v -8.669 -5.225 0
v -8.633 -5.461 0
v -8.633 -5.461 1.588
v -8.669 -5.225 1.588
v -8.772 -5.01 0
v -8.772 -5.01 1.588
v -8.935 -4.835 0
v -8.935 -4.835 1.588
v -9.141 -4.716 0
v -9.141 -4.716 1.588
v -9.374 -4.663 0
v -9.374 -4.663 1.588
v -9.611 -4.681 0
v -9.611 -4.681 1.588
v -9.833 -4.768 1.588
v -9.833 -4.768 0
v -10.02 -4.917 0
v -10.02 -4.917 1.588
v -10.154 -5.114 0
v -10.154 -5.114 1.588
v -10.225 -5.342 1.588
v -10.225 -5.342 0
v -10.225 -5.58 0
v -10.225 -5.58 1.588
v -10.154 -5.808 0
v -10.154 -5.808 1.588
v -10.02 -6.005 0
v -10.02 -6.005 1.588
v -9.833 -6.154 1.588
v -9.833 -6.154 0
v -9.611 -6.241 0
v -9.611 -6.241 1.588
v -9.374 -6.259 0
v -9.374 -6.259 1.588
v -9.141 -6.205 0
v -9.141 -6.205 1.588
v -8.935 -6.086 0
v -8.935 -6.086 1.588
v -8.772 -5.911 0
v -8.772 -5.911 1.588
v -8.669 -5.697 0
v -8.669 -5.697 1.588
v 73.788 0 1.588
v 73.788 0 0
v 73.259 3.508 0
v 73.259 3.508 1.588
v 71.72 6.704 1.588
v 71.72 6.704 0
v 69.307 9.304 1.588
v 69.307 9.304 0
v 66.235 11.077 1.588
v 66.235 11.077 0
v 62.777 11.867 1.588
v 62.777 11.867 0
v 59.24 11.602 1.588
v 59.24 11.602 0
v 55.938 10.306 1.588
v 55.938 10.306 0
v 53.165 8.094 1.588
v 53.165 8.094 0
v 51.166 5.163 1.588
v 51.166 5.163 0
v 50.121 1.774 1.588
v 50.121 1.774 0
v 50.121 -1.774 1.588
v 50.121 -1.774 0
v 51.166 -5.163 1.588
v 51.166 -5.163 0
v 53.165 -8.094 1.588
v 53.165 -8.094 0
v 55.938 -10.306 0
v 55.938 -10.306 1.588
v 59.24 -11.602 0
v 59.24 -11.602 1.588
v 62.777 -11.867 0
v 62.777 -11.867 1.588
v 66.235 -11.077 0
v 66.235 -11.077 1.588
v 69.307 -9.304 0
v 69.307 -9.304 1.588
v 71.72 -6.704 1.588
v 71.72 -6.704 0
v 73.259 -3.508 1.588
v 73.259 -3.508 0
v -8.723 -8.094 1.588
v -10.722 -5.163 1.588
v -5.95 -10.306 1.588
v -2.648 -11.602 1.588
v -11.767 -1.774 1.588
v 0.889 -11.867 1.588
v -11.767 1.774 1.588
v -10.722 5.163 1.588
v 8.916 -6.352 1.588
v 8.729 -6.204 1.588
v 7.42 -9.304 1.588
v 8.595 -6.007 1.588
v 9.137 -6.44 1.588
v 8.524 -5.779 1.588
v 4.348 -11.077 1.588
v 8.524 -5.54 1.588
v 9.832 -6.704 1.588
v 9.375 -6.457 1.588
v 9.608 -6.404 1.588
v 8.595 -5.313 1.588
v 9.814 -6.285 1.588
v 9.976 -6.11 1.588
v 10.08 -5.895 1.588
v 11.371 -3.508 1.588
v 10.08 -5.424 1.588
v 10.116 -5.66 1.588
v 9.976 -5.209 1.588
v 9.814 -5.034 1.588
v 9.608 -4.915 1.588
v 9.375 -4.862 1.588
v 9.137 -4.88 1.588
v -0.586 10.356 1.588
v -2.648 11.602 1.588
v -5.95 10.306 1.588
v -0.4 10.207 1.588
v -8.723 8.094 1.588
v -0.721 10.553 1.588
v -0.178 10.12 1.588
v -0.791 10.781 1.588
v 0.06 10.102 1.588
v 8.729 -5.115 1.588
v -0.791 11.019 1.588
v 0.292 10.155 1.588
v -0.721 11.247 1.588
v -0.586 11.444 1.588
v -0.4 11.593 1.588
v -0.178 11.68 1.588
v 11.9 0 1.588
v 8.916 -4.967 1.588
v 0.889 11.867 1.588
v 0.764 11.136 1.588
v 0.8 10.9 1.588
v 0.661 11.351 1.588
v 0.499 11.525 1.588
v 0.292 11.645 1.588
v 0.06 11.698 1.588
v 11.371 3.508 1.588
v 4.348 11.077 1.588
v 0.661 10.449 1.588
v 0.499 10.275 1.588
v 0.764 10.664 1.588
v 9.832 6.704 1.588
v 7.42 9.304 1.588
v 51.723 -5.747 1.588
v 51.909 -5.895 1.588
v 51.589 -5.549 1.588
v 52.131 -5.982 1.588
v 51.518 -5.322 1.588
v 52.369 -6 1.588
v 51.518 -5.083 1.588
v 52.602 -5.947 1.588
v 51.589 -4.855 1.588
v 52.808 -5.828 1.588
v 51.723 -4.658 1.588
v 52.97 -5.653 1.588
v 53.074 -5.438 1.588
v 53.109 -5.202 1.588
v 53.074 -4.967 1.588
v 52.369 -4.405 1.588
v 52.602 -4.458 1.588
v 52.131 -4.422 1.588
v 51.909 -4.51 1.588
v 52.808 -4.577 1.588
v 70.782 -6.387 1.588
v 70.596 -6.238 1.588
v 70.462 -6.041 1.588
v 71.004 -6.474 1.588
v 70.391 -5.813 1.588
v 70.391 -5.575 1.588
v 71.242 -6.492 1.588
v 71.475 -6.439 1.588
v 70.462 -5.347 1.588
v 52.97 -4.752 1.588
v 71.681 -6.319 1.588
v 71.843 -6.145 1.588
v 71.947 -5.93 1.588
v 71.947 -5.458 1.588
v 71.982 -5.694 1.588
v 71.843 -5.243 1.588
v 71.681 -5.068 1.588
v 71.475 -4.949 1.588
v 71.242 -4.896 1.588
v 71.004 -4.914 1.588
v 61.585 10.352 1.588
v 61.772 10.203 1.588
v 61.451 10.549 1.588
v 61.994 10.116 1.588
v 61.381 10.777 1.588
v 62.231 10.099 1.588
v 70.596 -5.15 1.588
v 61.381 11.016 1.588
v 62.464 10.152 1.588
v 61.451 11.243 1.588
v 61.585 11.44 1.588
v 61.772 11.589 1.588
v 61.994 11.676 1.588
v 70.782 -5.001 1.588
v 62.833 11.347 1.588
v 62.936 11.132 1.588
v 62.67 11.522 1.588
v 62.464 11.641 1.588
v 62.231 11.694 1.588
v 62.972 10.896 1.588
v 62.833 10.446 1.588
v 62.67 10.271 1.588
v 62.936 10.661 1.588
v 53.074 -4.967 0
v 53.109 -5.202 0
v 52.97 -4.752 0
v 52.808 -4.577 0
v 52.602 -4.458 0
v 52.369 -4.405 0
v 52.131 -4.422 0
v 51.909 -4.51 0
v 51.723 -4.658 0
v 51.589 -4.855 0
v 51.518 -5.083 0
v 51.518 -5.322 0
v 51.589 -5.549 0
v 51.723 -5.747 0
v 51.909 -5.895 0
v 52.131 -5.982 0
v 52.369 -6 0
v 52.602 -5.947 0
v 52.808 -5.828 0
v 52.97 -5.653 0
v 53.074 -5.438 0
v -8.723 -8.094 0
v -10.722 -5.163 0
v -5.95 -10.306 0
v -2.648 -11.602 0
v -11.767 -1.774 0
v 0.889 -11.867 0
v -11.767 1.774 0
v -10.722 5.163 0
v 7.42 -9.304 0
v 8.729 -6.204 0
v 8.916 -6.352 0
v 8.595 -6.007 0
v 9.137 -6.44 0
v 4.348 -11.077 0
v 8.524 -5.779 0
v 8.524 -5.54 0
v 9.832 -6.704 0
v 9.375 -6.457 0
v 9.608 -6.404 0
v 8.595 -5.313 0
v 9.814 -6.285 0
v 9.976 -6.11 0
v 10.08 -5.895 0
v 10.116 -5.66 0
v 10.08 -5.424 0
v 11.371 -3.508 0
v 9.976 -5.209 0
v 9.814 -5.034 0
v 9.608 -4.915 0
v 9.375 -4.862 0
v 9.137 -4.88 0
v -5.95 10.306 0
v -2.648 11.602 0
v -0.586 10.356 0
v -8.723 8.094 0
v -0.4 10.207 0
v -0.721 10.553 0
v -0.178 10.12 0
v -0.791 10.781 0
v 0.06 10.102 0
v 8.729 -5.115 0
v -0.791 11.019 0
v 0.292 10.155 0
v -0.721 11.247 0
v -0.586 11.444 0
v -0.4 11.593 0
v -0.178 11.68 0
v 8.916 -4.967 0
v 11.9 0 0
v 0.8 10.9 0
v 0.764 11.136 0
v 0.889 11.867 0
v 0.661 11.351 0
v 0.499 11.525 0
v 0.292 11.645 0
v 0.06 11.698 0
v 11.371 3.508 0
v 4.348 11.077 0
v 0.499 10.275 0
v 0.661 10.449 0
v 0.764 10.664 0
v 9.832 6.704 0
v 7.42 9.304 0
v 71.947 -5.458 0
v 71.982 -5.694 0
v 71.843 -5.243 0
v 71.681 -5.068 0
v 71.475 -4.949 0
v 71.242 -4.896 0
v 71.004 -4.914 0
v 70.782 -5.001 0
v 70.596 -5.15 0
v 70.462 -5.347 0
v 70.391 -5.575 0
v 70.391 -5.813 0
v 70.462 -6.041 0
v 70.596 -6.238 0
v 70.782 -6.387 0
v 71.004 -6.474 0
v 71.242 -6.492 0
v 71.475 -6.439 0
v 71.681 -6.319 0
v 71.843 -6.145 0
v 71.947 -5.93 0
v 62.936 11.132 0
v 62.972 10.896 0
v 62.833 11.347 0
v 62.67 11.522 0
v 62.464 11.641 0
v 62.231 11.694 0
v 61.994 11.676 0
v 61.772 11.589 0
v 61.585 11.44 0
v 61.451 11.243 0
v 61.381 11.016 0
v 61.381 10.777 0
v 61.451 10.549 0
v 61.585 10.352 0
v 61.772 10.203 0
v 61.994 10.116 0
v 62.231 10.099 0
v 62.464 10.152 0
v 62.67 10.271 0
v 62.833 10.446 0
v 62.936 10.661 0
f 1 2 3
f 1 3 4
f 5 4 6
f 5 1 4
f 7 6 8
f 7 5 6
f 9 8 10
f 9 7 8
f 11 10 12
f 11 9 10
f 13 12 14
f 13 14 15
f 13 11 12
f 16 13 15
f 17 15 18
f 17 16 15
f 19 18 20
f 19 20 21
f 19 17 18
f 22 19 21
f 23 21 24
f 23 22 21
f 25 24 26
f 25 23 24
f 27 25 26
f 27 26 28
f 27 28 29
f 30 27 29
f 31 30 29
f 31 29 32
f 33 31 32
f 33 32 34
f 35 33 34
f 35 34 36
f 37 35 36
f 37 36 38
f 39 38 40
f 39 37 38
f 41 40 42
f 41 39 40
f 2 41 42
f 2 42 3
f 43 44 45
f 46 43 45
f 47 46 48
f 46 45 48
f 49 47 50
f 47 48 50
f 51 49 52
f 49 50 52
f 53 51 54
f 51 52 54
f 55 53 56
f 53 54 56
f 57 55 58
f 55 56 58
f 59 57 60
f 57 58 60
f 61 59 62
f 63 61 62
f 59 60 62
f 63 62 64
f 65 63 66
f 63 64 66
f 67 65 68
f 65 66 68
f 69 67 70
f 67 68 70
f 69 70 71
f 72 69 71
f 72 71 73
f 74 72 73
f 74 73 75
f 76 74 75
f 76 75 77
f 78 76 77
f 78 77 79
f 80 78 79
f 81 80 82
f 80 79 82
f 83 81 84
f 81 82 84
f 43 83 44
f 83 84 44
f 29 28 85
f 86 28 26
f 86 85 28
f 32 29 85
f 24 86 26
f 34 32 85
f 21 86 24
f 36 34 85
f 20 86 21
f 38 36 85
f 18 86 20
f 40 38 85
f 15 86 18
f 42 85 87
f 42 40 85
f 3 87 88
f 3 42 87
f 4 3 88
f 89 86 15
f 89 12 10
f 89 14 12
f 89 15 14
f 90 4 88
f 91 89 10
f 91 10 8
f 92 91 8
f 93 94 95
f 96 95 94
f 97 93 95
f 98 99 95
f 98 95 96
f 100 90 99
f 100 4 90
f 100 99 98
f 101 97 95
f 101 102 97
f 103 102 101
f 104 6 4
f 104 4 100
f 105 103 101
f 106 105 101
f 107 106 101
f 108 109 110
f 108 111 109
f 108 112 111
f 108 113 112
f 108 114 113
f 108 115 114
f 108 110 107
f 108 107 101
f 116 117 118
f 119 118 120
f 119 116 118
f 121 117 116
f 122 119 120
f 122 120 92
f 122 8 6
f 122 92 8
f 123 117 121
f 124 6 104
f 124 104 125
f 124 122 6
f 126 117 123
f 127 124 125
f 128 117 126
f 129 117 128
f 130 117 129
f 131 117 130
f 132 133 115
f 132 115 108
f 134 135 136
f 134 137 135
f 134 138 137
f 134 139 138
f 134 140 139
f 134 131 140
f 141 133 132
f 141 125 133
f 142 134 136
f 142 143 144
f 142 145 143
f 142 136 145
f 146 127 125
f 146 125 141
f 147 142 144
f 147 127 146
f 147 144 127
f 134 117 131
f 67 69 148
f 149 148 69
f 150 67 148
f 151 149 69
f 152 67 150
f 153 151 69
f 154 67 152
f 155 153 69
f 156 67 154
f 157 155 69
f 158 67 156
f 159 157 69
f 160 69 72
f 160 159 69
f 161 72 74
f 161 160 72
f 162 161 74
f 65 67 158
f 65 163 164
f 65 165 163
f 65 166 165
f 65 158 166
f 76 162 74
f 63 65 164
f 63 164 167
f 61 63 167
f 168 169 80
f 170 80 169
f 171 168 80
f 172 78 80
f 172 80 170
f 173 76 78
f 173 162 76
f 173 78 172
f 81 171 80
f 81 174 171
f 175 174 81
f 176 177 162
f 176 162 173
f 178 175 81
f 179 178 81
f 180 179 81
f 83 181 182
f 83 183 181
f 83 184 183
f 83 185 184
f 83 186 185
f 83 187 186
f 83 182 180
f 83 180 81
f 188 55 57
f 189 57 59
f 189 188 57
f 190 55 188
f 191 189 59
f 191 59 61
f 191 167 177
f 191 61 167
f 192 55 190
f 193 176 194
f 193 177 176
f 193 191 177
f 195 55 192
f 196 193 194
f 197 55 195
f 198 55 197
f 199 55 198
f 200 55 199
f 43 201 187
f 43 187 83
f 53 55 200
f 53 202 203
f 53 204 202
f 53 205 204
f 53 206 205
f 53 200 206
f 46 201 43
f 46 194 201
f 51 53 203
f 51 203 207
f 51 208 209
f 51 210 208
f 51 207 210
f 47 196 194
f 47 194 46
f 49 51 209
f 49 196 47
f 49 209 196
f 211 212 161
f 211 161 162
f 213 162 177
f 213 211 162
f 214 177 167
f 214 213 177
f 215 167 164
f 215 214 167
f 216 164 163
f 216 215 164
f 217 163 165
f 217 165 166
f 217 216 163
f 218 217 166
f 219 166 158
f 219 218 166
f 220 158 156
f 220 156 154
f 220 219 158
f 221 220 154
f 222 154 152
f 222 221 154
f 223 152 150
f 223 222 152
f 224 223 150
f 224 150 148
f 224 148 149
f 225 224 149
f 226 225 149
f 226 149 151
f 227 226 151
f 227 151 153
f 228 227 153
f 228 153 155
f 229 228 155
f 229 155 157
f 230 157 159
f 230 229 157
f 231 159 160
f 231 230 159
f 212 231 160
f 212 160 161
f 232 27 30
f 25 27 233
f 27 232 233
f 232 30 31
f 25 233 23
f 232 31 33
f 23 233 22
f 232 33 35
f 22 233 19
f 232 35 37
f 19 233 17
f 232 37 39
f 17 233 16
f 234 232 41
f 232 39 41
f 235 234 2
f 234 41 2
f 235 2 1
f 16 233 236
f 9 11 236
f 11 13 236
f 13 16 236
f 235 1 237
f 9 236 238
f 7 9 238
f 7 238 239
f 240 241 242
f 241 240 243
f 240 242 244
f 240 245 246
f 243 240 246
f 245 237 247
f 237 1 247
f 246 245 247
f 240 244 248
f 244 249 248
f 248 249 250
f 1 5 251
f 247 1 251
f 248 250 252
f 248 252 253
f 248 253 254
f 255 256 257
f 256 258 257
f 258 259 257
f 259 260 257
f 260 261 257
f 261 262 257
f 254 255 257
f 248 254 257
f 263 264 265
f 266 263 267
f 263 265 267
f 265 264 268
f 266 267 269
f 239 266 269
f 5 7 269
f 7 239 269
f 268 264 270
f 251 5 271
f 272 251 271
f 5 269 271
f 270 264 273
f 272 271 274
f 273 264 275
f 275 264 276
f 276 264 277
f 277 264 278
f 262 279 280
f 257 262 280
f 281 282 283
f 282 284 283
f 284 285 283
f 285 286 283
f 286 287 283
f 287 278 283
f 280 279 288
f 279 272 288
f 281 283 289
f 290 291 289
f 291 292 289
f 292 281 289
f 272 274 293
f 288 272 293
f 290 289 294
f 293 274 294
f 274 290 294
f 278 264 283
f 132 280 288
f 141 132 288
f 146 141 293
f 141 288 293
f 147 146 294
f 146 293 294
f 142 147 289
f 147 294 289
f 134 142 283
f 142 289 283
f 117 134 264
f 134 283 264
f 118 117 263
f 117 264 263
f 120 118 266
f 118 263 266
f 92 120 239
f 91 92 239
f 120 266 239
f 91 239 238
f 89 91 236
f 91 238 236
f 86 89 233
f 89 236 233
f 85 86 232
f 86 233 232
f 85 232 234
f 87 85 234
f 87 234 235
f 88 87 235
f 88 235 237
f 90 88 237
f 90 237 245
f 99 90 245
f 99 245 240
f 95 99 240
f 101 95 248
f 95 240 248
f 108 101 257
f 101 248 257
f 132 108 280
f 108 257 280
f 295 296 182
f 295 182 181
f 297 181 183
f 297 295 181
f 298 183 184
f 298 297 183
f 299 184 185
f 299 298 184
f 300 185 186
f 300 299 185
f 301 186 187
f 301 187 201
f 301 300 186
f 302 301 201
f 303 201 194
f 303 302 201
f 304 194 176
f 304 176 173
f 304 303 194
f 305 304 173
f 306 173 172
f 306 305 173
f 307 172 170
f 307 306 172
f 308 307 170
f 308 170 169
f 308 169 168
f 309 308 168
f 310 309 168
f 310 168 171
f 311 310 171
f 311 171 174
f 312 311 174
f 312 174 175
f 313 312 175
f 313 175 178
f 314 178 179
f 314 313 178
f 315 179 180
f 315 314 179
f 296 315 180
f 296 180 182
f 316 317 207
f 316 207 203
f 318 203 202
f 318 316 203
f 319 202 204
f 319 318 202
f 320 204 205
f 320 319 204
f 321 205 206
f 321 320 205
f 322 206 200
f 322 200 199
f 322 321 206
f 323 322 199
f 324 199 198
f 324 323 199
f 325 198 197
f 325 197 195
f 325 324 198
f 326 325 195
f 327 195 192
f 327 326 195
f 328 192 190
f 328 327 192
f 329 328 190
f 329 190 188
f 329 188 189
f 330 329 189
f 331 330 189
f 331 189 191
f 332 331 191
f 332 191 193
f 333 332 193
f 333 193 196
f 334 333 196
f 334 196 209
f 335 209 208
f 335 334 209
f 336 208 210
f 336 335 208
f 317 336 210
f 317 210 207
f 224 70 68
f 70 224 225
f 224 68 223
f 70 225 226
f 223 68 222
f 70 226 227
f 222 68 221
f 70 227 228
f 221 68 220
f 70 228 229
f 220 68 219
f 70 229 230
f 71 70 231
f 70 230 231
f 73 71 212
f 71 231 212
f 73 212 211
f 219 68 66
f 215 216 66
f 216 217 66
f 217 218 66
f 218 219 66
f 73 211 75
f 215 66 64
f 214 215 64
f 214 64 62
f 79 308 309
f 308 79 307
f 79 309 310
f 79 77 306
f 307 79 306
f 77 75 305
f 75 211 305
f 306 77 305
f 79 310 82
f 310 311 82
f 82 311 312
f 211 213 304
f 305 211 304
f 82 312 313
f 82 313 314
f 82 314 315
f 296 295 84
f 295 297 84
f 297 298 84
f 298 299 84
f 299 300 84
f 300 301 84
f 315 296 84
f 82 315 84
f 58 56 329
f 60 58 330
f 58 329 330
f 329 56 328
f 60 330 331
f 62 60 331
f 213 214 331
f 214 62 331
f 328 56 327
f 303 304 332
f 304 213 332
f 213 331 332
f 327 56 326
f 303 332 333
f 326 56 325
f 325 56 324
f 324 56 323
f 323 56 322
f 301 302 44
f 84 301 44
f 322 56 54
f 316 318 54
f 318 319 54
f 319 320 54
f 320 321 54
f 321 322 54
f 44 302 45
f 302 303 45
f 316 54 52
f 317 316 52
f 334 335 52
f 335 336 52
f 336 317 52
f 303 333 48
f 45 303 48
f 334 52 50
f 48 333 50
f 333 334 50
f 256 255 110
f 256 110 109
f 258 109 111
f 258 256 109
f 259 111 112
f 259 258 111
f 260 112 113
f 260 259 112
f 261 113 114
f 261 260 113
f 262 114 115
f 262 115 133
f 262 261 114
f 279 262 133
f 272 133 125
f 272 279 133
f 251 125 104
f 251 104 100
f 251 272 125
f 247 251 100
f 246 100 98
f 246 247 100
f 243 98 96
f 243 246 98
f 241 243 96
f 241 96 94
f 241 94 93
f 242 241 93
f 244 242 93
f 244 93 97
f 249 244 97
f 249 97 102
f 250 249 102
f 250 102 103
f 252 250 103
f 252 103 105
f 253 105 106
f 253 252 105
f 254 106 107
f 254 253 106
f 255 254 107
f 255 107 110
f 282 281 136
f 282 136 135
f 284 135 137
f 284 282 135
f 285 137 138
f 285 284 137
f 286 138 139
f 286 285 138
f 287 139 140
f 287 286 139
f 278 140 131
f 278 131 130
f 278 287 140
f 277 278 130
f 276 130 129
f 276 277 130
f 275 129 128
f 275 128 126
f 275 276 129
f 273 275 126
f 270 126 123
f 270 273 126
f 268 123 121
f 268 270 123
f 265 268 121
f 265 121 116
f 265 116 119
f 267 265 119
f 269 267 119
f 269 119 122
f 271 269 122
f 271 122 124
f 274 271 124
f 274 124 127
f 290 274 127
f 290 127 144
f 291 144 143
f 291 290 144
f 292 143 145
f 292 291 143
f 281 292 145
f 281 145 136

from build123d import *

# Parameters (mm, degrees)
F0_R     = 11.9
F0_R_2   = 0.8
F1_DEPTH = 1.5875
F2_R     = 11.9
F2_R_2   = 0.8
F3_DEPTH = 1.5875


# Not quite as in the source:
# - a length typed as a fraction of an inch, garbled in the dataset ("3 / 203.2 mm" for 3/8 in), is restored


with BuildPart() as f1:
    # F0 (on Top) → F1 (new body)
    with BuildSketch(Plane.XY):
        Circle(F0_R)
        with Locations((-9.4334447669, -5.4607801485)):
            Circle(F0_R_2, mode=Mode.SUBTRACT)
        with Locations((9.3155007377, -5.6596330275)):
            Circle(F0_R_2, mode=Mode.SUBTRACT)
        with Locations((0, 10.9)):
            Circle(F0_R_2, mode=Mode.SUBTRACT)
    extrude(amount=F1_DEPTH)


with BuildPart() as f3:
    # F2 (on Top) → F3 (new body)
    with BuildSketch(Plane.XY):
        with Locations((61.8878431498, 0)):
            Circle(F2_R)
        with Locations((52.3094763812, -5.2023927231)):
            Circle(F2_R_2, mode=Mode.SUBTRACT)
        with Locations((71.1824307928, -5.6939125869)):
            Circle(F2_R_2, mode=Mode.SUBTRACT)
        with Locations((62.1716222755, 10.89630531)):
            Circle(F2_R_2, mode=Mode.SUBTRACT)
    extrude(amount=F3_DEPTH)


solid = Compound([f1.part, f3.part])
